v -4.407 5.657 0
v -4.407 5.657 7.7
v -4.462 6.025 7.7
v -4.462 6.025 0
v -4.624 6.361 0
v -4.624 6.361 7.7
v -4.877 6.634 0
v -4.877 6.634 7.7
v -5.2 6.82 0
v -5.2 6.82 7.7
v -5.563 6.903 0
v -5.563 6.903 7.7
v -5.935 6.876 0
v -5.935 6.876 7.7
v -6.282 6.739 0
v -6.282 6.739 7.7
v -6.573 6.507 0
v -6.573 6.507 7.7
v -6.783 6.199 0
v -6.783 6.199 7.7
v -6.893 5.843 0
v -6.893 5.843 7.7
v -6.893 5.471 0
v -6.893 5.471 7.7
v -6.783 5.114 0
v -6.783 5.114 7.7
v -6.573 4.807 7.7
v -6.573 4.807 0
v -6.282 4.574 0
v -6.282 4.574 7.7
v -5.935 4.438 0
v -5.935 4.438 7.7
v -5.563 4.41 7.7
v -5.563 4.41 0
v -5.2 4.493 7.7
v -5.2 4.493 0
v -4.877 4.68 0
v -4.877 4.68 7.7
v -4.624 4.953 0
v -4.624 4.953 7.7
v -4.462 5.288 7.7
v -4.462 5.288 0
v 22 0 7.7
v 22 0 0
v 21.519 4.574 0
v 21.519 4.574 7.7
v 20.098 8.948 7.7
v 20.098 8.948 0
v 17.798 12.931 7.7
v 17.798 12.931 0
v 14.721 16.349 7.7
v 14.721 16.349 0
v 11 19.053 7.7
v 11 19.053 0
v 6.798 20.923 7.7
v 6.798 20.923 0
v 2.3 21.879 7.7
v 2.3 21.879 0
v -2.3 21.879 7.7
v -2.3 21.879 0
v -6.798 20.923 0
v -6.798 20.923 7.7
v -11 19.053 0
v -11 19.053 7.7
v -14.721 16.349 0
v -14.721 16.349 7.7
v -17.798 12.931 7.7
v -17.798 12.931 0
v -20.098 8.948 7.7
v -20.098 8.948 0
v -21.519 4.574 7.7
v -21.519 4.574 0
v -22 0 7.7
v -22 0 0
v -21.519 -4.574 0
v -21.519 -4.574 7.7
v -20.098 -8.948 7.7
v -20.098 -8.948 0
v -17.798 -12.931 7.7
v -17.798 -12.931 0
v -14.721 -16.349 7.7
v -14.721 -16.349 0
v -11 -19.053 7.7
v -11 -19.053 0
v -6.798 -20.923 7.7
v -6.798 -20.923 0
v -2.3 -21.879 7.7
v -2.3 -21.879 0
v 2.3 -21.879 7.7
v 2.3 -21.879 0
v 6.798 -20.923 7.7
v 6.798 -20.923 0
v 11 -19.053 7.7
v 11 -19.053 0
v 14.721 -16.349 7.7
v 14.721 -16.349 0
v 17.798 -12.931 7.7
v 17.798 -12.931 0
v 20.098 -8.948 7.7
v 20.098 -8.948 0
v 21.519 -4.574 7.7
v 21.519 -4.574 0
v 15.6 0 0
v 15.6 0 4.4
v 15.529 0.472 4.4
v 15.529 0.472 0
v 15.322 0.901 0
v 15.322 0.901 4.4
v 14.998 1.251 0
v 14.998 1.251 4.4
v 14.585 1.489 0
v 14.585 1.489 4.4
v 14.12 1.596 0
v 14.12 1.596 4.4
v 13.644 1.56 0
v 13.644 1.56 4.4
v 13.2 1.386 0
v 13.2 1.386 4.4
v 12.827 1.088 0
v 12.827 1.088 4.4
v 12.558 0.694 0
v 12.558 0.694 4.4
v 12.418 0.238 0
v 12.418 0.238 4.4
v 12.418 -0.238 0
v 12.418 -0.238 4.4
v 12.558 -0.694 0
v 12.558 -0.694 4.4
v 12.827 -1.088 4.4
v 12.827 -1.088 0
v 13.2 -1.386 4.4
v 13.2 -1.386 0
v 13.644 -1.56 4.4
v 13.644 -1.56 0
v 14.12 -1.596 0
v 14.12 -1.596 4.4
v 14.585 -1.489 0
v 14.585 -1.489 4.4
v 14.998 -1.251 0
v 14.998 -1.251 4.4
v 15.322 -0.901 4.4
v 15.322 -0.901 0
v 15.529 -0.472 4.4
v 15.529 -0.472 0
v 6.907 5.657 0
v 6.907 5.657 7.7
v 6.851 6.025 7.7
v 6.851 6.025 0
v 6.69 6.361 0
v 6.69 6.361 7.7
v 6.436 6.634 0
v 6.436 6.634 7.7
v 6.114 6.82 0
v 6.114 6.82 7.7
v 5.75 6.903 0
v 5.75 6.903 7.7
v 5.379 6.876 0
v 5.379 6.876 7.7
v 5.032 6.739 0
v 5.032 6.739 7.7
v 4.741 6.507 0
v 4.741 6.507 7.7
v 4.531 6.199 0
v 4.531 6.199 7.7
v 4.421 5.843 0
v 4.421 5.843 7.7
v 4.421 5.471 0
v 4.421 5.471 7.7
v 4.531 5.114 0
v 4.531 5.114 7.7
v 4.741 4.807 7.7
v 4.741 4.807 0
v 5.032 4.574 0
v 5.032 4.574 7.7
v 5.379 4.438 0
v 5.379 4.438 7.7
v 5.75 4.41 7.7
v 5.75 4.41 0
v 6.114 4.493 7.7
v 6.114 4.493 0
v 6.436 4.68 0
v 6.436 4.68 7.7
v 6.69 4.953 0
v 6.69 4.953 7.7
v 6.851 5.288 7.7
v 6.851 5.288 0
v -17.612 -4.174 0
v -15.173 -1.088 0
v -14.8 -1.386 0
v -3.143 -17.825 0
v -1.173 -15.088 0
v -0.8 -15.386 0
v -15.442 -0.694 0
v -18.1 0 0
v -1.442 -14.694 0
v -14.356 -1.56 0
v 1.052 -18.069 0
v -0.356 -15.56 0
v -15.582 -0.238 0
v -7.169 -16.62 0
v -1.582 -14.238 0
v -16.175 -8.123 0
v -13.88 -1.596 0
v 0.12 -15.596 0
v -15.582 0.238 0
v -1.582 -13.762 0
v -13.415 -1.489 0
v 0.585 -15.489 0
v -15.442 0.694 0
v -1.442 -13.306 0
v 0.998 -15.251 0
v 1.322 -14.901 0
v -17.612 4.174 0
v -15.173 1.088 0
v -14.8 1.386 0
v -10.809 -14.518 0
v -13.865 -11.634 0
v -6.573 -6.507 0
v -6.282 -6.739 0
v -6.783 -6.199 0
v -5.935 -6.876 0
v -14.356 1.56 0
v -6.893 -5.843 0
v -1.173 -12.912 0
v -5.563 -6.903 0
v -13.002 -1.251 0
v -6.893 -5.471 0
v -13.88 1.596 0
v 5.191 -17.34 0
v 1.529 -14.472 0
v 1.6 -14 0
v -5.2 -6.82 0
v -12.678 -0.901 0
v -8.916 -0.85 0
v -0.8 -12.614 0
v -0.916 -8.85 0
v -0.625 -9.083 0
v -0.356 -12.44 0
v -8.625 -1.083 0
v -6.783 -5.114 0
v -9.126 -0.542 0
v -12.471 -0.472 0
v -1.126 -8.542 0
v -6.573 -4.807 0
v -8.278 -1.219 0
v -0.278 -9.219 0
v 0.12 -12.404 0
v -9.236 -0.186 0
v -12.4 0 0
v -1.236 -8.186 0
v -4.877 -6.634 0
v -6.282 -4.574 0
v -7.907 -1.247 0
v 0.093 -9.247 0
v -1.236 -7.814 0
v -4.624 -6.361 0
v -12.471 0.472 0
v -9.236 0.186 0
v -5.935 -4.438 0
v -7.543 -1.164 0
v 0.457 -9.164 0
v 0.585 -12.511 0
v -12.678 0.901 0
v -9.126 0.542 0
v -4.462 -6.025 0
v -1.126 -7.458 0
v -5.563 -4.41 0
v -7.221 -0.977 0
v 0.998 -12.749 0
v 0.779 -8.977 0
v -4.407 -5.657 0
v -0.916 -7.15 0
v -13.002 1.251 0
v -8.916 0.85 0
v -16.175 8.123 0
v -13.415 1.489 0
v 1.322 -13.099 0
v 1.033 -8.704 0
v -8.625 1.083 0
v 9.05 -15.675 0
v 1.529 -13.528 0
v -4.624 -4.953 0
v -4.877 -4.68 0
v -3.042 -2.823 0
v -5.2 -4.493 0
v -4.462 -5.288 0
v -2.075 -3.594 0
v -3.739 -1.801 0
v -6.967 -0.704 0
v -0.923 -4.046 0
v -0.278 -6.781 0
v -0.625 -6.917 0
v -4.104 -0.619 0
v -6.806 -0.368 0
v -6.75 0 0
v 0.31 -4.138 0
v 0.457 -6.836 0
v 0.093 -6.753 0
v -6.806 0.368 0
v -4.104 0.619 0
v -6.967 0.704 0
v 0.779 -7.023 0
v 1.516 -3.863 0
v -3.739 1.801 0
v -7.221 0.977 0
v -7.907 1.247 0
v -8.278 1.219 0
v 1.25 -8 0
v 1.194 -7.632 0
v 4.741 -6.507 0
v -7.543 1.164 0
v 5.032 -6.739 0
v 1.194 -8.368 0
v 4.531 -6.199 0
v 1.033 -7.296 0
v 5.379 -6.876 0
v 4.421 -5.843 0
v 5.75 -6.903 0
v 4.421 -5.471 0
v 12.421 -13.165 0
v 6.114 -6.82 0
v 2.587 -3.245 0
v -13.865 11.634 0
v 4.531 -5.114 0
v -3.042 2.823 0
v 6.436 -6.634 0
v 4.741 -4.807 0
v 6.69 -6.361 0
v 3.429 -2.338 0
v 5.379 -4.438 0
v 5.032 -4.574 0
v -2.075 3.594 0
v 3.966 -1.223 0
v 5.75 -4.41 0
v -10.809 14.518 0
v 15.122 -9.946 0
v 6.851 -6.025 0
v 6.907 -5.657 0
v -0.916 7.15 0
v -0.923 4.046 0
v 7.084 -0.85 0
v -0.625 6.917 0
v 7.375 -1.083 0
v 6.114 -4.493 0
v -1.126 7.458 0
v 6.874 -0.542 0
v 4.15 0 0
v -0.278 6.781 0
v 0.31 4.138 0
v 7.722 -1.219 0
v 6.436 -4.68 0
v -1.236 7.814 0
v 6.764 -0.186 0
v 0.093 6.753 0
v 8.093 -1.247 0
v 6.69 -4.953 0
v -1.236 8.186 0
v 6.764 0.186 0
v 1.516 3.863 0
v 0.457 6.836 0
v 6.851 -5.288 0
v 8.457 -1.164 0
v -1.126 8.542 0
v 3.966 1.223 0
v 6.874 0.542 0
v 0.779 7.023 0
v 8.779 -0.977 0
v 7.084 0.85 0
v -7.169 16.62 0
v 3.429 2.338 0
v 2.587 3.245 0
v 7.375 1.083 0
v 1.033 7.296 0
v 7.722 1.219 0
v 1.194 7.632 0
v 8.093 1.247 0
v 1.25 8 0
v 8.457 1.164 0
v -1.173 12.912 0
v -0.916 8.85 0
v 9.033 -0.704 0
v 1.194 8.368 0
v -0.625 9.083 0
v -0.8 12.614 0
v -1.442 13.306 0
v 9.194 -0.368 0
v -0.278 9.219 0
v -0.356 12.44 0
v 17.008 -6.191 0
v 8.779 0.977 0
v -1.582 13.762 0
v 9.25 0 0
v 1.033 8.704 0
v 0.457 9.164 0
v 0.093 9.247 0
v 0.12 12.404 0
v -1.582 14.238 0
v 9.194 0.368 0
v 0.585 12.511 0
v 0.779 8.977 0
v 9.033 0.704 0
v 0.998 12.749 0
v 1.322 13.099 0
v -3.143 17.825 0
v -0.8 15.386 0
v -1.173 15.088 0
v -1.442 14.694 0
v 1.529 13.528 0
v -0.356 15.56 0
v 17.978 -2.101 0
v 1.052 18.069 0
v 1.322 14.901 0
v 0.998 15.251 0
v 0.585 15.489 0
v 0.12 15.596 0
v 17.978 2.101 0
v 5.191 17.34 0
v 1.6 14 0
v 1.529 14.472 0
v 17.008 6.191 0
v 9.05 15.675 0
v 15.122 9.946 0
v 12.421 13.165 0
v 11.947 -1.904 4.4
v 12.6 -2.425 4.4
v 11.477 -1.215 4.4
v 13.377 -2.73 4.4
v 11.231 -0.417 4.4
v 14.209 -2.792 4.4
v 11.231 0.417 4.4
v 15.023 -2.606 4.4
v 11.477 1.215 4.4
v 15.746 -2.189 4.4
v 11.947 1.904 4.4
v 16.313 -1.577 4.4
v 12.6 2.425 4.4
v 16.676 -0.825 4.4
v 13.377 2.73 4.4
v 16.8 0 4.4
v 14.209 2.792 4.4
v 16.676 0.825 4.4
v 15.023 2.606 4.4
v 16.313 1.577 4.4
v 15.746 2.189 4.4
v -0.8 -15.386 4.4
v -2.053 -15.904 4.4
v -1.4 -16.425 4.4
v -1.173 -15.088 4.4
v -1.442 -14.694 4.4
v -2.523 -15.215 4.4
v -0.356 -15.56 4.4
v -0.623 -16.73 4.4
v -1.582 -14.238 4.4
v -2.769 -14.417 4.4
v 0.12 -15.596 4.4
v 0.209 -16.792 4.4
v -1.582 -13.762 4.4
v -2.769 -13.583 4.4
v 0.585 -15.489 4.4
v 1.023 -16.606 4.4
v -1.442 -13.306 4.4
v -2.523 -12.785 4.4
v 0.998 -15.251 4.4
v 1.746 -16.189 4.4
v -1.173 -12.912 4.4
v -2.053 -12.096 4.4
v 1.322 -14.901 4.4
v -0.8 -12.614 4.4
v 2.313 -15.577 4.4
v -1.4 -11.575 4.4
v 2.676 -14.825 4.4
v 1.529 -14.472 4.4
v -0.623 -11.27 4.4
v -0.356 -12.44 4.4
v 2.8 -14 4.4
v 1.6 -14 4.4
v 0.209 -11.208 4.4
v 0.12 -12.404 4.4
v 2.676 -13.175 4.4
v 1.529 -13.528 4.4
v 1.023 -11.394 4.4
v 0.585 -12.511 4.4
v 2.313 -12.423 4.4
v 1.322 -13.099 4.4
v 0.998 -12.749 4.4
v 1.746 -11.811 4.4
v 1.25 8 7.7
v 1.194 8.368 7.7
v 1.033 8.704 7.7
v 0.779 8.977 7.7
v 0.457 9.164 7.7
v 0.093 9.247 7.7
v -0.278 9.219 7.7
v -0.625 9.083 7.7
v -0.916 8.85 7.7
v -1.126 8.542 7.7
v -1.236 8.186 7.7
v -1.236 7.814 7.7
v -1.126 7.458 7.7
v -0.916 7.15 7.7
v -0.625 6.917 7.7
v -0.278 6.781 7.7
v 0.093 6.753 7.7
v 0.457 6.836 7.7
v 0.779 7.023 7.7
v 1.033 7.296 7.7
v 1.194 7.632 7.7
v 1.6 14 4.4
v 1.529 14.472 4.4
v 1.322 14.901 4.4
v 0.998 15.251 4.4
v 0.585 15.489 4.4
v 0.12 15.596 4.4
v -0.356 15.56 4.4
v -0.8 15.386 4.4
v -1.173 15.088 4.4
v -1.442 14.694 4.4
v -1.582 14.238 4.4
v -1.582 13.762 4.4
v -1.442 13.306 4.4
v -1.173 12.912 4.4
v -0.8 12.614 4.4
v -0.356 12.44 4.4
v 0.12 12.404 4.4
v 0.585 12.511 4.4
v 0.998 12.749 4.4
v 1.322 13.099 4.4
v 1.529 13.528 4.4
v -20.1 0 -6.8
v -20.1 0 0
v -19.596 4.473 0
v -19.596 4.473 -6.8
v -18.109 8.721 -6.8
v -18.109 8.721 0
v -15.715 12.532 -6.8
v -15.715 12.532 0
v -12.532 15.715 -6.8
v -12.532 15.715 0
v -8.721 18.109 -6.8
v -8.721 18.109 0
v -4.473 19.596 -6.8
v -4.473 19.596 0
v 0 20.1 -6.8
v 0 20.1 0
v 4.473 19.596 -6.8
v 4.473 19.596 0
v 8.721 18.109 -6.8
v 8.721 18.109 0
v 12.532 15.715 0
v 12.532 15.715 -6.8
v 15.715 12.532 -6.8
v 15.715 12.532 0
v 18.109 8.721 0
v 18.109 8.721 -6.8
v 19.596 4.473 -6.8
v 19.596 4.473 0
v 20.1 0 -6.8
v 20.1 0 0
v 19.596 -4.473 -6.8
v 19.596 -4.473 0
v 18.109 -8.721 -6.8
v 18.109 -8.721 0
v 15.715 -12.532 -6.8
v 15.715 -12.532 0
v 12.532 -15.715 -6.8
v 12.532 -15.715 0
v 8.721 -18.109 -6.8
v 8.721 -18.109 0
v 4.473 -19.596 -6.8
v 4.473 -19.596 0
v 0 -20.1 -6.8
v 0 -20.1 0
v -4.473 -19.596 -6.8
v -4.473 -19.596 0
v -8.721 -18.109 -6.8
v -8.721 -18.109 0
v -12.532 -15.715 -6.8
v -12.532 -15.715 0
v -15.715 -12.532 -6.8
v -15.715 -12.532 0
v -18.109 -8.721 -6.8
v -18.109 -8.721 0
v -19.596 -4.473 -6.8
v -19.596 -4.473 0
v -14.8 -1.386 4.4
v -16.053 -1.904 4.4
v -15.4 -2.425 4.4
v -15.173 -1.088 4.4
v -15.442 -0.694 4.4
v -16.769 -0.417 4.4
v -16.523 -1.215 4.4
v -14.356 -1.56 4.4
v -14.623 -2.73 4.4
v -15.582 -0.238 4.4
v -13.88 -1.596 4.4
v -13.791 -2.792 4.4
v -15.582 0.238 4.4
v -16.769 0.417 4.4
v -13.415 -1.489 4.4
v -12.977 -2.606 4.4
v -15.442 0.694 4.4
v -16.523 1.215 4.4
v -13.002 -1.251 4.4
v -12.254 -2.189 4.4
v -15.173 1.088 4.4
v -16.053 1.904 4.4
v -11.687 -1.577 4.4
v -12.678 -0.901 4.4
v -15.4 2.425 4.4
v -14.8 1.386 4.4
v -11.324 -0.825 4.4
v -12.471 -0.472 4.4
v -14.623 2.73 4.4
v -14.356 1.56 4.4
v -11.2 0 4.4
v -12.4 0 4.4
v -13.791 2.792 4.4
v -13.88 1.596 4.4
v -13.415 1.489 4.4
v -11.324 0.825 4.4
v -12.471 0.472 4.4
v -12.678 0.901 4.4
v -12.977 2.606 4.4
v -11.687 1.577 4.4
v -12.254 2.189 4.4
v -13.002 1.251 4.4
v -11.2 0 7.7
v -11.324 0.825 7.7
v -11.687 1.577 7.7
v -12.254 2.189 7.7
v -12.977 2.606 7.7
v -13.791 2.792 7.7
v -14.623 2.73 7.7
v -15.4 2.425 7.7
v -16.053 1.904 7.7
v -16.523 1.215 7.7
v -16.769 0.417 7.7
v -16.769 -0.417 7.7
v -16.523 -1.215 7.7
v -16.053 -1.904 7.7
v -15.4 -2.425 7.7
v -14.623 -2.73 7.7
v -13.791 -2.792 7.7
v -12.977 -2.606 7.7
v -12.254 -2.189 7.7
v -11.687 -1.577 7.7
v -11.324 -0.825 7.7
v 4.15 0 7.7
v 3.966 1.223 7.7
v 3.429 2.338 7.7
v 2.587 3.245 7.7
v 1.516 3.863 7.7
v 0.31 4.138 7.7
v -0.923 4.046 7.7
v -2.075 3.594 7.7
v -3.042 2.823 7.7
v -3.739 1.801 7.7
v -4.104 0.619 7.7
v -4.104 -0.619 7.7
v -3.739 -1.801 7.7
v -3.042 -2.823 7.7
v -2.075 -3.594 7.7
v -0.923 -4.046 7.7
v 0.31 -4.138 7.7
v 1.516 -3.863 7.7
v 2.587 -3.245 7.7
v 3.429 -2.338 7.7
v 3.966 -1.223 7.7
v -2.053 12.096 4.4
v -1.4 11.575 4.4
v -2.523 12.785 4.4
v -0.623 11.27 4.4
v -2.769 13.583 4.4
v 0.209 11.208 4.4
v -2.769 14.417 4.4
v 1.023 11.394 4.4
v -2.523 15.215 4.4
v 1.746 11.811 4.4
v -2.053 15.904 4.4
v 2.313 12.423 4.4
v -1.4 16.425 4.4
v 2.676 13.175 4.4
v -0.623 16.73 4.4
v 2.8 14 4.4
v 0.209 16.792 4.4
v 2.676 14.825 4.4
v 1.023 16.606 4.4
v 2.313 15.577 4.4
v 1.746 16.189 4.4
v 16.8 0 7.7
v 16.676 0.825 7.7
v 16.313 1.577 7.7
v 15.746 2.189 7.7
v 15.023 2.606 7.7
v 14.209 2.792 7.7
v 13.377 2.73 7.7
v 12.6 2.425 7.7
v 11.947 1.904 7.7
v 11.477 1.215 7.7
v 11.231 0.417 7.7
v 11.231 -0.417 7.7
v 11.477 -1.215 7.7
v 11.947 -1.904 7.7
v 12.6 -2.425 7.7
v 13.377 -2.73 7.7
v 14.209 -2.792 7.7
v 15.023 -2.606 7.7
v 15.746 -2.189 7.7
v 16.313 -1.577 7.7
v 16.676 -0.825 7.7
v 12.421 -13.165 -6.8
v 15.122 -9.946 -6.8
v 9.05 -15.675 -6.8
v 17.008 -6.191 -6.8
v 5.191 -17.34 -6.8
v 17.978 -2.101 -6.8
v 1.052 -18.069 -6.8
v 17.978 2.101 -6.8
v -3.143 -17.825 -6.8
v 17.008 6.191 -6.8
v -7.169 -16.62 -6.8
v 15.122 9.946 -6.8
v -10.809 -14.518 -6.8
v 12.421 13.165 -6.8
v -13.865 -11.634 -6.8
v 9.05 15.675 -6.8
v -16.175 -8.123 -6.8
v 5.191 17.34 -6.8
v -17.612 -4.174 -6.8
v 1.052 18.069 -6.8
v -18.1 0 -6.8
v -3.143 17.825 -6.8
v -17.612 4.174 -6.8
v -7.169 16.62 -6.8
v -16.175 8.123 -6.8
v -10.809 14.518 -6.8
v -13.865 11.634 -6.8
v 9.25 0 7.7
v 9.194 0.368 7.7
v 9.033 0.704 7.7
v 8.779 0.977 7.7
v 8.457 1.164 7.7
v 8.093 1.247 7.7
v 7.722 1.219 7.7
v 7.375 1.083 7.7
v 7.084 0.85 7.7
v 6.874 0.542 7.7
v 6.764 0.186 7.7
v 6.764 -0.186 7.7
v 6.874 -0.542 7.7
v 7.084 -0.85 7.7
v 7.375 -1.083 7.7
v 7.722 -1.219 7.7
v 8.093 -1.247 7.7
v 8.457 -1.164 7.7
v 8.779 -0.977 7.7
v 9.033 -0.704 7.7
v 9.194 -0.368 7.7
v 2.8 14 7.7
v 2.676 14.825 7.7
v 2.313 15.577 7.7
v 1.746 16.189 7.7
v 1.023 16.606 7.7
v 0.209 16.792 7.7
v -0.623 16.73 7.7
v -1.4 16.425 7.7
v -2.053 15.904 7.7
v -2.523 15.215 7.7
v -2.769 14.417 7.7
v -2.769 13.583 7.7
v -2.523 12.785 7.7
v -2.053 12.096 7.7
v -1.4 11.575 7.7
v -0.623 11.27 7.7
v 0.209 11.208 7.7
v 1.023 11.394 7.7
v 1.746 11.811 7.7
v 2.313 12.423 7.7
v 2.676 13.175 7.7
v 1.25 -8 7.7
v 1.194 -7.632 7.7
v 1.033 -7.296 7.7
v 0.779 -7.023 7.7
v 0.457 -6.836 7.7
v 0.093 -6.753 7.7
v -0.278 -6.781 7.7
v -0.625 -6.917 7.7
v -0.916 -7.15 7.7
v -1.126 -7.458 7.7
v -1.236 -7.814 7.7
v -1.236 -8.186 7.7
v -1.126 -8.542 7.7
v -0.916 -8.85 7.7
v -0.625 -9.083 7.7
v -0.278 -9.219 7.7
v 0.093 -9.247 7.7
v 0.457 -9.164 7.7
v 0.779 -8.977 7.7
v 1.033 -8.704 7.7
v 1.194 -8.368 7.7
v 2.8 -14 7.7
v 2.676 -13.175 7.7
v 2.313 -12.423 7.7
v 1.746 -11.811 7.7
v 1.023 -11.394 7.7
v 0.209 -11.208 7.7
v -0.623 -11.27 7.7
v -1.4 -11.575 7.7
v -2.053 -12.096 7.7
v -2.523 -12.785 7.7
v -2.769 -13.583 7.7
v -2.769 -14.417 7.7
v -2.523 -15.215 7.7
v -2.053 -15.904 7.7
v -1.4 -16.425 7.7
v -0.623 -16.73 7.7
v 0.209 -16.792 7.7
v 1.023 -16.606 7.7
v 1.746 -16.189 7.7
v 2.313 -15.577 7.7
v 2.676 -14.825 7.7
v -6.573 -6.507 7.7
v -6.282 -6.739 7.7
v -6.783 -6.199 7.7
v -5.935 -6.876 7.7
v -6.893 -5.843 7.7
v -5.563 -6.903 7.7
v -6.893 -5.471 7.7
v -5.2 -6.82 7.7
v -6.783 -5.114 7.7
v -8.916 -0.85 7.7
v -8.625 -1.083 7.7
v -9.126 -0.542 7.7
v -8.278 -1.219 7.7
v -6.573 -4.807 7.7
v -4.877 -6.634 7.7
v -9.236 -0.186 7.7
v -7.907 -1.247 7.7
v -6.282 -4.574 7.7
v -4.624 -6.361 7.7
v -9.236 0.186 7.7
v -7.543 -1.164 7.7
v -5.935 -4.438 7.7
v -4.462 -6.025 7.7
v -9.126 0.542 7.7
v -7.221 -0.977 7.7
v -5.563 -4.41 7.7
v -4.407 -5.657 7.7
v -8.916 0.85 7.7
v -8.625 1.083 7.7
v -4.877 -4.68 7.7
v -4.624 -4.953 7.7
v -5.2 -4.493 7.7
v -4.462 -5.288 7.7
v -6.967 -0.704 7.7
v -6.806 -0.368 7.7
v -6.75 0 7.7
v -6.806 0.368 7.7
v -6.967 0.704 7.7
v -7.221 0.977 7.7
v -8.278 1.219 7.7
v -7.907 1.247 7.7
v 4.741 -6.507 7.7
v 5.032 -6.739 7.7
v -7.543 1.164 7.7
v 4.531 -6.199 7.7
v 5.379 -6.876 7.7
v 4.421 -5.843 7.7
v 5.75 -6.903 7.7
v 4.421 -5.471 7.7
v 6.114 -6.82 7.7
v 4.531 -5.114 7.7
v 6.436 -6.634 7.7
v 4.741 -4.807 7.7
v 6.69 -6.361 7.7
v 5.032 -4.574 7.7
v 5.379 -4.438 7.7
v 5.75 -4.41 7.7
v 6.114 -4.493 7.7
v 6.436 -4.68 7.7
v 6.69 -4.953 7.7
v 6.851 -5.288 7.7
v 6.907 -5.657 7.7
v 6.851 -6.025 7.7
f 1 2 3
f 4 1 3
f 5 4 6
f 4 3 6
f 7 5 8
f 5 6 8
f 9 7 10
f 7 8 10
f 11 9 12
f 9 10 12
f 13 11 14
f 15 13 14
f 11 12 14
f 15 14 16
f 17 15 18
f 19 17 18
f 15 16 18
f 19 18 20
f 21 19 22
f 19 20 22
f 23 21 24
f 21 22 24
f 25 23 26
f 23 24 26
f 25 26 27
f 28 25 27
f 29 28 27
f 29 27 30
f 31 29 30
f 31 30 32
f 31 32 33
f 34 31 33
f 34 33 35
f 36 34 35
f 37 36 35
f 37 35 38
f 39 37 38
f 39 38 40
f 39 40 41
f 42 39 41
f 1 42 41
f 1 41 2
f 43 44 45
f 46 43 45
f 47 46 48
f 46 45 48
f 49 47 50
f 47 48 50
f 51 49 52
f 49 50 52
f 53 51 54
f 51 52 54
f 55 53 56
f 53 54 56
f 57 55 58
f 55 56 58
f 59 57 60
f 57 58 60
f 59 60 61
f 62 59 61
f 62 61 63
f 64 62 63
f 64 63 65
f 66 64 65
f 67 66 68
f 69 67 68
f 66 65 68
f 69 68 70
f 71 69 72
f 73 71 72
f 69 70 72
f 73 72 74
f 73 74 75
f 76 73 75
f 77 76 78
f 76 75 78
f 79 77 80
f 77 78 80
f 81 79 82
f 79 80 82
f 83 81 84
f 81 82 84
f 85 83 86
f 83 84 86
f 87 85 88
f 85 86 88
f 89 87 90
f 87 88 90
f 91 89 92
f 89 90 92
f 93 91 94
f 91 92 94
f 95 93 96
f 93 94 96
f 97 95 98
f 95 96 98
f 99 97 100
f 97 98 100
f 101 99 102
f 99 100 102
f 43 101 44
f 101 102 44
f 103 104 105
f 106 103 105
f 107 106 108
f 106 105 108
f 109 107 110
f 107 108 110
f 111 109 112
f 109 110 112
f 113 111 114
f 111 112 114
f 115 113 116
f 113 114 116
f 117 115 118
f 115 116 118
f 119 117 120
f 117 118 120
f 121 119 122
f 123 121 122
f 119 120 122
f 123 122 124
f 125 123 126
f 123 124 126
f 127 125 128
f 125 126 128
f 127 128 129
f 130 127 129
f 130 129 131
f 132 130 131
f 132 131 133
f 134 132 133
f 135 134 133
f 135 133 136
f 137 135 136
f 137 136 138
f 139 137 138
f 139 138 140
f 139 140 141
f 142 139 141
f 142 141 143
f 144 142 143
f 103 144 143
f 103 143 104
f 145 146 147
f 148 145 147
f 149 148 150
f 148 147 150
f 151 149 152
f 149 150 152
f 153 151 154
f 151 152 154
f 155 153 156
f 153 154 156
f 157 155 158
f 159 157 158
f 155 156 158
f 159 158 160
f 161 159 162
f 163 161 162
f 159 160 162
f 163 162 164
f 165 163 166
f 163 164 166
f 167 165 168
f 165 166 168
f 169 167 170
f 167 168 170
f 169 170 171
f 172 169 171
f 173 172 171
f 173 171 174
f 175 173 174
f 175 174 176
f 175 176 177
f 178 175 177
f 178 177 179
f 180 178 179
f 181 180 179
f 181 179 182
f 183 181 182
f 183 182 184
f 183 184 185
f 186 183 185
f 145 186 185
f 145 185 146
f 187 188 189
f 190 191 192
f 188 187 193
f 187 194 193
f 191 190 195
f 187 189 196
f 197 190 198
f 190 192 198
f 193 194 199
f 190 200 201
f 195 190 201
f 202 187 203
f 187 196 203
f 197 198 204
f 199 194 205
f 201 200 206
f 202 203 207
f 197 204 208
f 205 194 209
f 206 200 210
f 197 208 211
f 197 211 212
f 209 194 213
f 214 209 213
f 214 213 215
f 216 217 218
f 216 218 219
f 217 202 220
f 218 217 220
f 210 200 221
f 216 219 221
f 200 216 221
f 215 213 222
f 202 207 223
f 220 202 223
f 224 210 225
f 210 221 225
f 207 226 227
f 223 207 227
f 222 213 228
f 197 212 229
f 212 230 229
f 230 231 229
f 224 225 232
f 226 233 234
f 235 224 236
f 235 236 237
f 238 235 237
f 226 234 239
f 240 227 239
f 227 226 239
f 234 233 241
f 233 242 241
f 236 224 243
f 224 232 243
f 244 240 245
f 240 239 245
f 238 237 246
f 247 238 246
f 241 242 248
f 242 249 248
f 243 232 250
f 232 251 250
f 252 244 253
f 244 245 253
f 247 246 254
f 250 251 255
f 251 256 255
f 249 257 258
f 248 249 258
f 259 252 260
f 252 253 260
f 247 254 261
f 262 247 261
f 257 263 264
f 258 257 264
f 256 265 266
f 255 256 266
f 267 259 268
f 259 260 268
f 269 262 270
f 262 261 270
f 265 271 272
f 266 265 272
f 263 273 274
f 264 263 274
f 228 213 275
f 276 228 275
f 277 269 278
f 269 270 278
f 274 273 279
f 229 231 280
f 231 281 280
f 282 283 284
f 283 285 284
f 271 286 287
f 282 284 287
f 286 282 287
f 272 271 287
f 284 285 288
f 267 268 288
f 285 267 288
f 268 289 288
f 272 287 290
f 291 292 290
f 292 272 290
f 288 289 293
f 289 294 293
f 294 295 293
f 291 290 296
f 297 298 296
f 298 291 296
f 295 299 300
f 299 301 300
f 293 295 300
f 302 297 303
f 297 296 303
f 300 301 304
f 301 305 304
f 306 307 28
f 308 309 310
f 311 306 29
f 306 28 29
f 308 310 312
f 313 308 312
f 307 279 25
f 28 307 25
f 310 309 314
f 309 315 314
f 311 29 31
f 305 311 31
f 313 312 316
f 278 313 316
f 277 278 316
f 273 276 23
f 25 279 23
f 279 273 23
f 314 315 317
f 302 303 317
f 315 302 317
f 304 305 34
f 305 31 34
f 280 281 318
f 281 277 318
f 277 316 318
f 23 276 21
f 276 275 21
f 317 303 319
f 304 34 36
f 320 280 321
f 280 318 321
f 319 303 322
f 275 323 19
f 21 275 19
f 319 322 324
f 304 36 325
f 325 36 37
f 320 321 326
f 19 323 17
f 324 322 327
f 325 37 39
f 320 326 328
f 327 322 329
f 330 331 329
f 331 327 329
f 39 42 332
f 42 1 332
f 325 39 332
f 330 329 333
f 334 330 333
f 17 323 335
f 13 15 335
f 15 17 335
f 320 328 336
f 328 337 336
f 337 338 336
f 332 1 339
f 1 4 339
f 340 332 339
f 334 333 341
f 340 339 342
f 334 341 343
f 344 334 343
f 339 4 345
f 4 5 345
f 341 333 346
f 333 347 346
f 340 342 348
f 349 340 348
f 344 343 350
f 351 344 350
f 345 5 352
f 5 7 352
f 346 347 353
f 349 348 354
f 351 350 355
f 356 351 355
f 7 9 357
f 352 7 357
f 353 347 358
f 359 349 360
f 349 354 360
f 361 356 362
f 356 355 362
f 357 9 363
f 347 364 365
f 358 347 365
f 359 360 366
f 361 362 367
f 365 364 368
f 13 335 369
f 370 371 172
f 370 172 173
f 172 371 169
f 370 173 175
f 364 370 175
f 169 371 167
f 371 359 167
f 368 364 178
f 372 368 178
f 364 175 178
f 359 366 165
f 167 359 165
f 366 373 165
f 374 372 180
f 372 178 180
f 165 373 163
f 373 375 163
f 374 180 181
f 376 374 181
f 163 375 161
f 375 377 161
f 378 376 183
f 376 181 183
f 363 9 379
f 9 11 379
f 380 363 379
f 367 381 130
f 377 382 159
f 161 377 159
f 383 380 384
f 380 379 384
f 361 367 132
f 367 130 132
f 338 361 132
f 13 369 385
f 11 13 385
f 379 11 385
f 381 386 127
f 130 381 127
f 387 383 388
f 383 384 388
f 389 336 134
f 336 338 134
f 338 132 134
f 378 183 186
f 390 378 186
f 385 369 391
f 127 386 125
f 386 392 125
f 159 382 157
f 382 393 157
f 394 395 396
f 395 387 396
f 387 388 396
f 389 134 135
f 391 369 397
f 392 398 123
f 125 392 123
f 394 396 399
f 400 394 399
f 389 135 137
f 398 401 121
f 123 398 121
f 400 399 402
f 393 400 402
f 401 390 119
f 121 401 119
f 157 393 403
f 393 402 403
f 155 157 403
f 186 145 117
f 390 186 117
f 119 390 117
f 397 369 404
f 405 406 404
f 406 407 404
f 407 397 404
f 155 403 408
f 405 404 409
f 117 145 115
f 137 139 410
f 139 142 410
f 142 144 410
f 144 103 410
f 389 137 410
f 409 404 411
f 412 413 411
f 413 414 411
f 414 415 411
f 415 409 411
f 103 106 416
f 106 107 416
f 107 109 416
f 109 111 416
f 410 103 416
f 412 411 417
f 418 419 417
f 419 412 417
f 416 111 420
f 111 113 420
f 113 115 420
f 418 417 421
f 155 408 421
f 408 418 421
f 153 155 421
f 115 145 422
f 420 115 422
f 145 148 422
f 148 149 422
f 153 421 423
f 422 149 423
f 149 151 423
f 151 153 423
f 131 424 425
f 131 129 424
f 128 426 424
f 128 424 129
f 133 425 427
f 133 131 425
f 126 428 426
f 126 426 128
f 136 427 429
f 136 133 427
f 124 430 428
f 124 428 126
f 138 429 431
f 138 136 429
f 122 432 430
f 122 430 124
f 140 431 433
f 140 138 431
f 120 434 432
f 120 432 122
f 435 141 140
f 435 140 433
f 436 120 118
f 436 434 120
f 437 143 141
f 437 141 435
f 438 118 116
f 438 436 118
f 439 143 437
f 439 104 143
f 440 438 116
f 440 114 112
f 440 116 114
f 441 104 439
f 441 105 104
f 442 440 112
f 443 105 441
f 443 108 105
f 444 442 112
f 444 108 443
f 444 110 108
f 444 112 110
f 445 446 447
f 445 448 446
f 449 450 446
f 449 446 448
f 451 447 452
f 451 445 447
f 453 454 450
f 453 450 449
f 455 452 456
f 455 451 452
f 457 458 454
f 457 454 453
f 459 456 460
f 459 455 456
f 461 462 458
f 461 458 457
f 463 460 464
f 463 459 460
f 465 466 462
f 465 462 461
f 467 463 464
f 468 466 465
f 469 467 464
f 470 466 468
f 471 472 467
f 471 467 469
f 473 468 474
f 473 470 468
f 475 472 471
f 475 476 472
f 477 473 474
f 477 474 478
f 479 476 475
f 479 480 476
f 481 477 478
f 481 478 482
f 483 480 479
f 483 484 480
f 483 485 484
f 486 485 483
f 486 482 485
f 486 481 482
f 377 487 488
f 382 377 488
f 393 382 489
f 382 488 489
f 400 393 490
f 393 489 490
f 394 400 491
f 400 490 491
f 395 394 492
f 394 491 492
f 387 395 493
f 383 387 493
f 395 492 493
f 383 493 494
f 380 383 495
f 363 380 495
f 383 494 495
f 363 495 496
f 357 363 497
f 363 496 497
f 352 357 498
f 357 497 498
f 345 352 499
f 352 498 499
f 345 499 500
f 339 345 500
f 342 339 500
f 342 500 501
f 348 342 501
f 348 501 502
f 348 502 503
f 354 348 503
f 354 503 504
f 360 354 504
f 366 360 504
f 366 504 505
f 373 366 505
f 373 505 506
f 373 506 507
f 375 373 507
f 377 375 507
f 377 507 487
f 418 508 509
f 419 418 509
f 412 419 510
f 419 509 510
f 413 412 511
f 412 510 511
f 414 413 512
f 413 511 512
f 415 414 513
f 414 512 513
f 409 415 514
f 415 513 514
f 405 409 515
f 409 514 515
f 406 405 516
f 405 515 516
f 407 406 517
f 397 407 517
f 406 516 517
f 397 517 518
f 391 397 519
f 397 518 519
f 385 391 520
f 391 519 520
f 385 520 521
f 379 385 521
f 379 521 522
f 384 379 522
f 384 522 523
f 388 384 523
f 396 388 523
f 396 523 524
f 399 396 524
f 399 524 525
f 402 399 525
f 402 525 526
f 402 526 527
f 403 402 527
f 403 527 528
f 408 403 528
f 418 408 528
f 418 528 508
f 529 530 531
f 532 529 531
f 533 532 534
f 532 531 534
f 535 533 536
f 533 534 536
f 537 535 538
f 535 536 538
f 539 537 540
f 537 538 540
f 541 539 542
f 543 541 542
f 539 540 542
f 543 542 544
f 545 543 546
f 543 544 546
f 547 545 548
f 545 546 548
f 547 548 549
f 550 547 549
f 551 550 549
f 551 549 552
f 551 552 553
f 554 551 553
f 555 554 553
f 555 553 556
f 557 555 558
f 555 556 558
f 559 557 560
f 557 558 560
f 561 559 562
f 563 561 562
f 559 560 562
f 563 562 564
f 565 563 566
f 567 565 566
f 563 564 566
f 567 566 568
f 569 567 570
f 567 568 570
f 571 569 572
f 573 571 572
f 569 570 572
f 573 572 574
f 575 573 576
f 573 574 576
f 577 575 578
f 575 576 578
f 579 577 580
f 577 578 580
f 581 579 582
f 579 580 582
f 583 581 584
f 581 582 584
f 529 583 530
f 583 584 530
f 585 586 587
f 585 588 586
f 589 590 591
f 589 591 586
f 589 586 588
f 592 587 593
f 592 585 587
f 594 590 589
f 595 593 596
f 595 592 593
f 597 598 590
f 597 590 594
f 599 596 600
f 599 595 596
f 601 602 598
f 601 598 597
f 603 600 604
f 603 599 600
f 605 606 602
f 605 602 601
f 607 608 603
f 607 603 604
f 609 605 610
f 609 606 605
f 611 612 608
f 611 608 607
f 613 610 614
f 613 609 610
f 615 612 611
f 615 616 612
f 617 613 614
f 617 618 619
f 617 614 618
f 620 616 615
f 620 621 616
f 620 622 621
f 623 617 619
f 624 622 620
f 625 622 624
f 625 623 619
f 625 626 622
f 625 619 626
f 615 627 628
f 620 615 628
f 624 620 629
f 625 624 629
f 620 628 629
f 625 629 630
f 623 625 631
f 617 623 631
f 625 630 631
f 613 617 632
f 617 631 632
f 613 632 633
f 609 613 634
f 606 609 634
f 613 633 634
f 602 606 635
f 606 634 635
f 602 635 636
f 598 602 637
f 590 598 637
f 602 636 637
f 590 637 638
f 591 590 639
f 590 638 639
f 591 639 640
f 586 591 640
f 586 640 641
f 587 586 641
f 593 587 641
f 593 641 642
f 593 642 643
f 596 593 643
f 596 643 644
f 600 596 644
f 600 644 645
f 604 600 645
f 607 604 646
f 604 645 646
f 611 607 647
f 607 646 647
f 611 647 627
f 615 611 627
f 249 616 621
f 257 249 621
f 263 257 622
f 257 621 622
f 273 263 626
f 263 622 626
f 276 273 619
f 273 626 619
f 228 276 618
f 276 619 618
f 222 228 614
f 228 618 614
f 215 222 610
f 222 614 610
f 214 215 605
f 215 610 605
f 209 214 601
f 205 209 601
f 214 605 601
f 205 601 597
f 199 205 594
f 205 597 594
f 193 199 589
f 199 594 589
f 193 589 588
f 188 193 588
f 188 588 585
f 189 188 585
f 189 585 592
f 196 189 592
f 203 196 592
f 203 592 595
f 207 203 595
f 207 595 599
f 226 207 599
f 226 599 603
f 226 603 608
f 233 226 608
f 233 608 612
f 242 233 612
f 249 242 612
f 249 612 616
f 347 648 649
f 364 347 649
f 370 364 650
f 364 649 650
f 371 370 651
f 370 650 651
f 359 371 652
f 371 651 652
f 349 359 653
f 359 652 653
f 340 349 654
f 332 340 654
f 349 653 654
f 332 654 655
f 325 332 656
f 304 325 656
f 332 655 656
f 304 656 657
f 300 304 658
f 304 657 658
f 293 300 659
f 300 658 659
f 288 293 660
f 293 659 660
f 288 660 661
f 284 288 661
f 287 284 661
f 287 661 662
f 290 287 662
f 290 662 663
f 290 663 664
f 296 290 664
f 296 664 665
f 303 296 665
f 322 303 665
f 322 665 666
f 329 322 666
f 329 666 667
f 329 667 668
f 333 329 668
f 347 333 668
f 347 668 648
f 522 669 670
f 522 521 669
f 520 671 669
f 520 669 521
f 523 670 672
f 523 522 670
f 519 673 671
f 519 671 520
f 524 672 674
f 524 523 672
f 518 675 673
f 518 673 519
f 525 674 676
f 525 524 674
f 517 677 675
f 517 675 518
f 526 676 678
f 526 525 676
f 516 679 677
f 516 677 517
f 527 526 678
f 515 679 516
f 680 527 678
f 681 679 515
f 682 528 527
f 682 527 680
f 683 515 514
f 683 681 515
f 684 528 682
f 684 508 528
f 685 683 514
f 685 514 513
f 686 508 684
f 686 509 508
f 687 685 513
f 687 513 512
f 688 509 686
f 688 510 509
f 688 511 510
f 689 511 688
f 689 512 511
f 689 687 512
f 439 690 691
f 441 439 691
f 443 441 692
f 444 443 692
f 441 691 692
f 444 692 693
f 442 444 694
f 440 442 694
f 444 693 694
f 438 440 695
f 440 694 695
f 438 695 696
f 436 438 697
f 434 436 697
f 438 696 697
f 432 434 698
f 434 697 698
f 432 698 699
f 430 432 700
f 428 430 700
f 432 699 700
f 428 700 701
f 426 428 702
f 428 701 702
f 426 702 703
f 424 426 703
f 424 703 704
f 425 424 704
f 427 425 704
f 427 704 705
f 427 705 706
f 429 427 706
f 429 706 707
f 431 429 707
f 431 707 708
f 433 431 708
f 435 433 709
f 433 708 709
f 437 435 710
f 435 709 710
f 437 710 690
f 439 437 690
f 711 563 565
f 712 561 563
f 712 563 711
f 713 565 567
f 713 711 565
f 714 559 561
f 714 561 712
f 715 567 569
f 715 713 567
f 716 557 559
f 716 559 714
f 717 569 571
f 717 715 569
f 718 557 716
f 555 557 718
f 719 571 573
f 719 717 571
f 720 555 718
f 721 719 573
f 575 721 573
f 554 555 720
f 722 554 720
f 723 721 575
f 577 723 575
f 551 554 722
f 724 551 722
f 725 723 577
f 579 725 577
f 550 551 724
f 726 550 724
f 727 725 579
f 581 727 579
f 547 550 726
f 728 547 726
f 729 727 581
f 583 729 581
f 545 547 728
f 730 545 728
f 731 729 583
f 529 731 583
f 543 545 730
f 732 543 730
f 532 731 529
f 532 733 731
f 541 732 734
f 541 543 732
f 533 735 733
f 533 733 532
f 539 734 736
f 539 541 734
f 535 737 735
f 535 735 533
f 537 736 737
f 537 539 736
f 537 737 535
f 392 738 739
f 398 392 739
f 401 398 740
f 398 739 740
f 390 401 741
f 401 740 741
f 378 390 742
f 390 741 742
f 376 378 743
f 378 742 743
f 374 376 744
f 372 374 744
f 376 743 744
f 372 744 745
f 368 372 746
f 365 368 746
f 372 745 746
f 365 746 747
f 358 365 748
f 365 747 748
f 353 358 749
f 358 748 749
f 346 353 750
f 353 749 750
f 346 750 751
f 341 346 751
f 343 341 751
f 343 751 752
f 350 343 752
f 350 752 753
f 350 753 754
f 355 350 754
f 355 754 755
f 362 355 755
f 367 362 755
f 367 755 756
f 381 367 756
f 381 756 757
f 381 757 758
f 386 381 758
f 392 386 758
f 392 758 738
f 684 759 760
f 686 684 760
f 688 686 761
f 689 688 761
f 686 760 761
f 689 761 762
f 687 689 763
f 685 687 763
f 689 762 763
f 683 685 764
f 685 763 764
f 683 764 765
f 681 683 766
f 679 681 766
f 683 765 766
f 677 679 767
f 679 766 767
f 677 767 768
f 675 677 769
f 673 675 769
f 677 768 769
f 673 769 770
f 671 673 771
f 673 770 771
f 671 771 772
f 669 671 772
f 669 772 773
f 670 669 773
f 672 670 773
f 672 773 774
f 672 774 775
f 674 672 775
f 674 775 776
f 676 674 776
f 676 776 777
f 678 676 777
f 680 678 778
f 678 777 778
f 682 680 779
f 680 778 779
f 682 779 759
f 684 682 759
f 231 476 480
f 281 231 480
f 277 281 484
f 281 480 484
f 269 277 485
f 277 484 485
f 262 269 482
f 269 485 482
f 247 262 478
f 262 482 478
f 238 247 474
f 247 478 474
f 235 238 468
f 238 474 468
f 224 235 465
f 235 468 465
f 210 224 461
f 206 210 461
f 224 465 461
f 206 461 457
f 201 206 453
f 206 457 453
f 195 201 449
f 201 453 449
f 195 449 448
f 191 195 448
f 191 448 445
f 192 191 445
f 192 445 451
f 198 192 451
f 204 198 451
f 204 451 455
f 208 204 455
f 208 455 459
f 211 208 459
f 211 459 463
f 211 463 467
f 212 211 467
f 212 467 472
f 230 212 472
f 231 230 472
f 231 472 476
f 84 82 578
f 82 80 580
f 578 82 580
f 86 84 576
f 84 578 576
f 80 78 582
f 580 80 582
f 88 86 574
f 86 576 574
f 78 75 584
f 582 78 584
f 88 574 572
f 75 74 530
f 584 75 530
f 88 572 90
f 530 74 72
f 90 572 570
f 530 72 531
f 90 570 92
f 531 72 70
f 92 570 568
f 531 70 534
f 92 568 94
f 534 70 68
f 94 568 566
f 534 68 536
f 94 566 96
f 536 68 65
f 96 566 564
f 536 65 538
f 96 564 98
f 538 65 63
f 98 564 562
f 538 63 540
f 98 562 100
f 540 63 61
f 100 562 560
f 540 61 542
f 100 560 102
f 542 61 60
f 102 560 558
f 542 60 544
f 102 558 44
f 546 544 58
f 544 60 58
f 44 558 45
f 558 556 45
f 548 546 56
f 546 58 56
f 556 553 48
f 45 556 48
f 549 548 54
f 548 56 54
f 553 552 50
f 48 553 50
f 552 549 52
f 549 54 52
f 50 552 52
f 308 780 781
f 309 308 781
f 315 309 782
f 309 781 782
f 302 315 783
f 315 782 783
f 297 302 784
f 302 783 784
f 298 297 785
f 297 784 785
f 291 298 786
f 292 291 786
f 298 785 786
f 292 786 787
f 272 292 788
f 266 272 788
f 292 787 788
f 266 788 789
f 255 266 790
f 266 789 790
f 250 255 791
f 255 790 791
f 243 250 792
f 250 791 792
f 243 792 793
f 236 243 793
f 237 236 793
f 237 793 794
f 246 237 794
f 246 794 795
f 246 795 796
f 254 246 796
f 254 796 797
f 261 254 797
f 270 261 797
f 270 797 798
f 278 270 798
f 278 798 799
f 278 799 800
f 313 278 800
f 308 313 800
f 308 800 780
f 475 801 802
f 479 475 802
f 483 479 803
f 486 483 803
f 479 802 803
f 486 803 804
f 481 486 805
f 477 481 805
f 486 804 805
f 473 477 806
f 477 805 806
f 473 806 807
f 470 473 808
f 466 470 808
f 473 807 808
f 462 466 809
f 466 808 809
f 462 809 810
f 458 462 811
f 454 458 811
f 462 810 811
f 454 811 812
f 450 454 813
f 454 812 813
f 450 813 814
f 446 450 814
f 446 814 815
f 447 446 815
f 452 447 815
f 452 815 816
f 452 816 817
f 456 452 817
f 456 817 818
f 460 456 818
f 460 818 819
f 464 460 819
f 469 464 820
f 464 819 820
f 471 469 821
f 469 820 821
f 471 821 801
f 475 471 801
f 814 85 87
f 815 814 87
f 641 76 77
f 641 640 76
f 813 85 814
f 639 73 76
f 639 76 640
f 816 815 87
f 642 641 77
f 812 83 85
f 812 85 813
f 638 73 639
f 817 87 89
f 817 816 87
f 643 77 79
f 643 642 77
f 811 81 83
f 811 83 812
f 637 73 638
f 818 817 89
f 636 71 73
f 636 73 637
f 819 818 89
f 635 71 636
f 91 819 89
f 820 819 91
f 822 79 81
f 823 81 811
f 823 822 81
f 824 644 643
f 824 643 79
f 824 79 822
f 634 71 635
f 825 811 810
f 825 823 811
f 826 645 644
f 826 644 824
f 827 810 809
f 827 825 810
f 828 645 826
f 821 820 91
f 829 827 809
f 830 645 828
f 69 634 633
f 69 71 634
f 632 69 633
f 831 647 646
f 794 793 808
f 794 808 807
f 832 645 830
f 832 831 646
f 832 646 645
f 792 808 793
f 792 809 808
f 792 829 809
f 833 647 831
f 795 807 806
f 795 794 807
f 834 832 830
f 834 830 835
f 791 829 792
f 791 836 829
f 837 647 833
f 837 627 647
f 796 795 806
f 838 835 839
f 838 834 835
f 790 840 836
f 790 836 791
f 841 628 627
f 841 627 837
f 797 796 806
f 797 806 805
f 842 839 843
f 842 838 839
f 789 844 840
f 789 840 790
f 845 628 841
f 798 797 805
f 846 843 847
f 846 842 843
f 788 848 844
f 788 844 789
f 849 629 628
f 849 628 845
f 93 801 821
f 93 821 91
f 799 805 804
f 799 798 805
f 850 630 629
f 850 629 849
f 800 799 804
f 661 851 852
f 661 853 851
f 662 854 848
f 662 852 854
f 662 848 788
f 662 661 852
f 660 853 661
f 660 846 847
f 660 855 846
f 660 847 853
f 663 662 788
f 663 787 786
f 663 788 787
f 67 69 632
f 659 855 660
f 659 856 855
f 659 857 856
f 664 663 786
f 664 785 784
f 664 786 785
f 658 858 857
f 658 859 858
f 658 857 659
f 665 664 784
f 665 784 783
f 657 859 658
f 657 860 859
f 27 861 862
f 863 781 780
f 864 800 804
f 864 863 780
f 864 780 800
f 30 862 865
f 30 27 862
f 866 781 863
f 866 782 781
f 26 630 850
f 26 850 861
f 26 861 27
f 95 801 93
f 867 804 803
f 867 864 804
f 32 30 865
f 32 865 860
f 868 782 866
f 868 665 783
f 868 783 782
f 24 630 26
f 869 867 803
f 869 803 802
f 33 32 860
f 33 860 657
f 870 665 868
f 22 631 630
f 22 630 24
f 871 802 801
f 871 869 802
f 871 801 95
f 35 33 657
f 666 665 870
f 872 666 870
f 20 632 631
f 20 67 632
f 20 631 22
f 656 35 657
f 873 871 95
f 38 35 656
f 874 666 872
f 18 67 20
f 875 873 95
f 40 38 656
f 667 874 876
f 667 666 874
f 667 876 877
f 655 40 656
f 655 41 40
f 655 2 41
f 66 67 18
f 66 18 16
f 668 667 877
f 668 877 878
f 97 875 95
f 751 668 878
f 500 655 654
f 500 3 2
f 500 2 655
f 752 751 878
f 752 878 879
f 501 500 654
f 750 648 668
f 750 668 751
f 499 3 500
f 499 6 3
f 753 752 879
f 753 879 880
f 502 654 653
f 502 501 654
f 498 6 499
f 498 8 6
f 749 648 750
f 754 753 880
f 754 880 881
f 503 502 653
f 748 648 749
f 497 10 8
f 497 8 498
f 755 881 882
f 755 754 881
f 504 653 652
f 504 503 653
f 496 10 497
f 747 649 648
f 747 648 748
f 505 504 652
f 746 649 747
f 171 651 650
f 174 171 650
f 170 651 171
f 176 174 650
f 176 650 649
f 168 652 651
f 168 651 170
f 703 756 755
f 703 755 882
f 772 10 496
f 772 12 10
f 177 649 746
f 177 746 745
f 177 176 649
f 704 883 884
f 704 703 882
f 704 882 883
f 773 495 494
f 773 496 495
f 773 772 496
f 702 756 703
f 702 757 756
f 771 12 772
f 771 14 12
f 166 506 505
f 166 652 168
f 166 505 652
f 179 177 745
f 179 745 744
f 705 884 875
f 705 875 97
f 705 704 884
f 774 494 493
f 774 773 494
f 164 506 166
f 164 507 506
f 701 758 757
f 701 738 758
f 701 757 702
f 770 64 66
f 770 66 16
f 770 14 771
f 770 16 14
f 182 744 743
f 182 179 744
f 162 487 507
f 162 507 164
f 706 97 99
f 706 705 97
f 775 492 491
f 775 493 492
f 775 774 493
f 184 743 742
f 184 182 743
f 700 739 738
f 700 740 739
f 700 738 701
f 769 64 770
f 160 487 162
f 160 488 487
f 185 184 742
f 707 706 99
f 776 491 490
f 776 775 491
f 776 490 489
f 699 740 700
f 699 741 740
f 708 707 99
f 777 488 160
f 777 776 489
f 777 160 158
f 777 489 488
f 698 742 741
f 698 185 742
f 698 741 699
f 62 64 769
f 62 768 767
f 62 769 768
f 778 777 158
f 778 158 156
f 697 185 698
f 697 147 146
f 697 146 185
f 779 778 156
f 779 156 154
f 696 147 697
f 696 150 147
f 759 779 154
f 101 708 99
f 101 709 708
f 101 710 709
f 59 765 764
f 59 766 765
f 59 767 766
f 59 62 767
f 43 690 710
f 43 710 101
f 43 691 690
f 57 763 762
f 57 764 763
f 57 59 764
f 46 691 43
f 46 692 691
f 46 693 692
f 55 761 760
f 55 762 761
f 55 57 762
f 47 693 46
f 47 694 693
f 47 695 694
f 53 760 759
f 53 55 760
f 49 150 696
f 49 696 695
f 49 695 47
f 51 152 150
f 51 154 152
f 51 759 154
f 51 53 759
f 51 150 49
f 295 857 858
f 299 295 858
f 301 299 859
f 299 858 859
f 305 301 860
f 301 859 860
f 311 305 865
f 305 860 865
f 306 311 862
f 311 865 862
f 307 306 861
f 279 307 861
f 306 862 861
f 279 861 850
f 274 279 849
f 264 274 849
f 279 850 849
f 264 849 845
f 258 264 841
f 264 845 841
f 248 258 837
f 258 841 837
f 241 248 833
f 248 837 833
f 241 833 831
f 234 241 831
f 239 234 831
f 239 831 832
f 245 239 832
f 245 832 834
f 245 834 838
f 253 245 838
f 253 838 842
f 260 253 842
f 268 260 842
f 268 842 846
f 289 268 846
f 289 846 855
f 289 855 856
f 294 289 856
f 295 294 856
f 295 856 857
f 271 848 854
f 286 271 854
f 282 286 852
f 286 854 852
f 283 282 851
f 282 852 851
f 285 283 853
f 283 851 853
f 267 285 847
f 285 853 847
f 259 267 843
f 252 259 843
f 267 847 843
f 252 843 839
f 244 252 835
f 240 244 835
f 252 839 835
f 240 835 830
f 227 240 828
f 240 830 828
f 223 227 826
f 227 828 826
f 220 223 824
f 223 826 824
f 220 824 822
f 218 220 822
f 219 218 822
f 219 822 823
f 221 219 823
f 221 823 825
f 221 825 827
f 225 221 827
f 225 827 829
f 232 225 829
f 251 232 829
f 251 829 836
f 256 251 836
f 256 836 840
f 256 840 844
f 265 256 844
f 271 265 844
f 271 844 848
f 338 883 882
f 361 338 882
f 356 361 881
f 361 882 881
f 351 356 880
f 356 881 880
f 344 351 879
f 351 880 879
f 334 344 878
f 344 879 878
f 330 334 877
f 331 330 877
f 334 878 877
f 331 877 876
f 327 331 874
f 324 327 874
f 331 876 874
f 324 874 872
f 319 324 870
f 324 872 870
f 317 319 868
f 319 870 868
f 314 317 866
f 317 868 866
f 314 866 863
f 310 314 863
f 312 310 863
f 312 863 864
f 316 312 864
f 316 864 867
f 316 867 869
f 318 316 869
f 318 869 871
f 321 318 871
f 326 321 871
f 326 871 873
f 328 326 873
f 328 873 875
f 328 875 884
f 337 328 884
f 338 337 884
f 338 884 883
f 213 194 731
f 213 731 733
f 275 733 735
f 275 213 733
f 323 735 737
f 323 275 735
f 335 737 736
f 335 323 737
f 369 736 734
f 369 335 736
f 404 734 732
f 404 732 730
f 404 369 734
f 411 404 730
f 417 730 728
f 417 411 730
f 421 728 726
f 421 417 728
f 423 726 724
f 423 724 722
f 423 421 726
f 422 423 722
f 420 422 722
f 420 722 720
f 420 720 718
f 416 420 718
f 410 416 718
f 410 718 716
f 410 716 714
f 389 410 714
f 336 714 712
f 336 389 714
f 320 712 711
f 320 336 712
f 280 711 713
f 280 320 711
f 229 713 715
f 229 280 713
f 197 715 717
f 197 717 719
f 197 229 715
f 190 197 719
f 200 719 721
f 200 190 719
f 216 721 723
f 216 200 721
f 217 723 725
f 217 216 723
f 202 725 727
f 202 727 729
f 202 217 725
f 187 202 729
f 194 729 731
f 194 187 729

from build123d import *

# Parameters (mm, degrees)
SKETCH1_R           = 22
BOSS_EXTRUDE1_DEPTH = 7.7
SKETCH2_R           = 20.1
SKETCH2_R_2         = 18.1
BOSS_EXTRUDE2_DEPTH = 6.8
SKETCH3_R           = 4.15
SKETCH3_R_2         = 1.25
CUT_EXTRUDE1_DEPTH  = 15.5
SKETCH4_R           = 2.8
CUT_EXTRUDE2_DEPTH  = 3.3
SKETCH6_R           = 1.6
CUT_EXTRUDE3_DEPTH  = 15.5


with BuildPart() as part:
    # Sketch1 → Boss-Extrude1 (new body)
    with BuildSketch(Plane.XY):
        Circle(SKETCH1_R)
    extrude(amount=BOSS_EXTRUDE1_DEPTH)

    # Sketch2 → Boss-Extrude2 (add)
    with BuildSketch(Plane(origin=(0, 0, 0), x_dir=(-1, 0, 0), z_dir=(0, 0, -1))):
        Circle(SKETCH2_R)
        Circle(SKETCH2_R_2, mode=Mode.SUBTRACT)
    extrude(amount=BOSS_EXTRUDE2_DEPTH)

    # Sketch3 → Cut-Extrude1 (cut, through all)
    with BuildSketch(Plane.XY.offset(7.7)):
        Circle(SKETCH3_R)
        with Locations((0, 8)):
            Circle(SKETCH3_R_2)
        with Locations((5.656854249, 5.656854249)):
            Circle(SKETCH3_R_2)
        with Locations((8, 0)):
            Circle(SKETCH3_R_2)
        with Locations((5.656854249, -5.656854249)):
            Circle(SKETCH3_R_2)
        with Locations((0, -8)):
            Circle(SKETCH3_R_2)
        with Locations((-5.656854249, -5.656854249)):
            Circle(SKETCH3_R_2)
        with Locations((-8, 0)):
            Circle(SKETCH3_R_2)
        with Locations((-5.656854249, 5.656854249)):
            Circle(SKETCH3_R_2)
    extrude(amount=-CUT_EXTRUDE1_DEPTH, mode=Mode.SUBTRACT)

    # Sketch4 → Cut-Extrude2 (cut)
    with BuildSketch(Plane.XY.offset(7.7)):
        with Locations((14, 0)):
            Circle(SKETCH4_R)
        with Locations((0, -14)):
            Circle(SKETCH4_R)
        with Locations((-14, 0)):
            Circle(SKETCH4_R)
        with Locations((0, 14)):
            Circle(SKETCH4_R)
    extrude(amount=-CUT_EXTRUDE2_DEPTH, mode=Mode.SUBTRACT)

    # Sketch6 → Cut-Extrude3 (cut, through all)
    with BuildSketch(Plane.XY.offset(7.7)):
        with Locations((14, 0)):
            Circle(SKETCH6_R)
        with Locations((0, -14)):
            Circle(SKETCH6_R)
        with Locations((-14, 0)):
            Circle(SKETCH6_R)
        with Locations((0, 14)):
            Circle(SKETCH6_R)
    extrude(amount=-CUT_EXTRUDE3_DEPTH, mode=Mode.SUBTRACT)


solid = part.part
